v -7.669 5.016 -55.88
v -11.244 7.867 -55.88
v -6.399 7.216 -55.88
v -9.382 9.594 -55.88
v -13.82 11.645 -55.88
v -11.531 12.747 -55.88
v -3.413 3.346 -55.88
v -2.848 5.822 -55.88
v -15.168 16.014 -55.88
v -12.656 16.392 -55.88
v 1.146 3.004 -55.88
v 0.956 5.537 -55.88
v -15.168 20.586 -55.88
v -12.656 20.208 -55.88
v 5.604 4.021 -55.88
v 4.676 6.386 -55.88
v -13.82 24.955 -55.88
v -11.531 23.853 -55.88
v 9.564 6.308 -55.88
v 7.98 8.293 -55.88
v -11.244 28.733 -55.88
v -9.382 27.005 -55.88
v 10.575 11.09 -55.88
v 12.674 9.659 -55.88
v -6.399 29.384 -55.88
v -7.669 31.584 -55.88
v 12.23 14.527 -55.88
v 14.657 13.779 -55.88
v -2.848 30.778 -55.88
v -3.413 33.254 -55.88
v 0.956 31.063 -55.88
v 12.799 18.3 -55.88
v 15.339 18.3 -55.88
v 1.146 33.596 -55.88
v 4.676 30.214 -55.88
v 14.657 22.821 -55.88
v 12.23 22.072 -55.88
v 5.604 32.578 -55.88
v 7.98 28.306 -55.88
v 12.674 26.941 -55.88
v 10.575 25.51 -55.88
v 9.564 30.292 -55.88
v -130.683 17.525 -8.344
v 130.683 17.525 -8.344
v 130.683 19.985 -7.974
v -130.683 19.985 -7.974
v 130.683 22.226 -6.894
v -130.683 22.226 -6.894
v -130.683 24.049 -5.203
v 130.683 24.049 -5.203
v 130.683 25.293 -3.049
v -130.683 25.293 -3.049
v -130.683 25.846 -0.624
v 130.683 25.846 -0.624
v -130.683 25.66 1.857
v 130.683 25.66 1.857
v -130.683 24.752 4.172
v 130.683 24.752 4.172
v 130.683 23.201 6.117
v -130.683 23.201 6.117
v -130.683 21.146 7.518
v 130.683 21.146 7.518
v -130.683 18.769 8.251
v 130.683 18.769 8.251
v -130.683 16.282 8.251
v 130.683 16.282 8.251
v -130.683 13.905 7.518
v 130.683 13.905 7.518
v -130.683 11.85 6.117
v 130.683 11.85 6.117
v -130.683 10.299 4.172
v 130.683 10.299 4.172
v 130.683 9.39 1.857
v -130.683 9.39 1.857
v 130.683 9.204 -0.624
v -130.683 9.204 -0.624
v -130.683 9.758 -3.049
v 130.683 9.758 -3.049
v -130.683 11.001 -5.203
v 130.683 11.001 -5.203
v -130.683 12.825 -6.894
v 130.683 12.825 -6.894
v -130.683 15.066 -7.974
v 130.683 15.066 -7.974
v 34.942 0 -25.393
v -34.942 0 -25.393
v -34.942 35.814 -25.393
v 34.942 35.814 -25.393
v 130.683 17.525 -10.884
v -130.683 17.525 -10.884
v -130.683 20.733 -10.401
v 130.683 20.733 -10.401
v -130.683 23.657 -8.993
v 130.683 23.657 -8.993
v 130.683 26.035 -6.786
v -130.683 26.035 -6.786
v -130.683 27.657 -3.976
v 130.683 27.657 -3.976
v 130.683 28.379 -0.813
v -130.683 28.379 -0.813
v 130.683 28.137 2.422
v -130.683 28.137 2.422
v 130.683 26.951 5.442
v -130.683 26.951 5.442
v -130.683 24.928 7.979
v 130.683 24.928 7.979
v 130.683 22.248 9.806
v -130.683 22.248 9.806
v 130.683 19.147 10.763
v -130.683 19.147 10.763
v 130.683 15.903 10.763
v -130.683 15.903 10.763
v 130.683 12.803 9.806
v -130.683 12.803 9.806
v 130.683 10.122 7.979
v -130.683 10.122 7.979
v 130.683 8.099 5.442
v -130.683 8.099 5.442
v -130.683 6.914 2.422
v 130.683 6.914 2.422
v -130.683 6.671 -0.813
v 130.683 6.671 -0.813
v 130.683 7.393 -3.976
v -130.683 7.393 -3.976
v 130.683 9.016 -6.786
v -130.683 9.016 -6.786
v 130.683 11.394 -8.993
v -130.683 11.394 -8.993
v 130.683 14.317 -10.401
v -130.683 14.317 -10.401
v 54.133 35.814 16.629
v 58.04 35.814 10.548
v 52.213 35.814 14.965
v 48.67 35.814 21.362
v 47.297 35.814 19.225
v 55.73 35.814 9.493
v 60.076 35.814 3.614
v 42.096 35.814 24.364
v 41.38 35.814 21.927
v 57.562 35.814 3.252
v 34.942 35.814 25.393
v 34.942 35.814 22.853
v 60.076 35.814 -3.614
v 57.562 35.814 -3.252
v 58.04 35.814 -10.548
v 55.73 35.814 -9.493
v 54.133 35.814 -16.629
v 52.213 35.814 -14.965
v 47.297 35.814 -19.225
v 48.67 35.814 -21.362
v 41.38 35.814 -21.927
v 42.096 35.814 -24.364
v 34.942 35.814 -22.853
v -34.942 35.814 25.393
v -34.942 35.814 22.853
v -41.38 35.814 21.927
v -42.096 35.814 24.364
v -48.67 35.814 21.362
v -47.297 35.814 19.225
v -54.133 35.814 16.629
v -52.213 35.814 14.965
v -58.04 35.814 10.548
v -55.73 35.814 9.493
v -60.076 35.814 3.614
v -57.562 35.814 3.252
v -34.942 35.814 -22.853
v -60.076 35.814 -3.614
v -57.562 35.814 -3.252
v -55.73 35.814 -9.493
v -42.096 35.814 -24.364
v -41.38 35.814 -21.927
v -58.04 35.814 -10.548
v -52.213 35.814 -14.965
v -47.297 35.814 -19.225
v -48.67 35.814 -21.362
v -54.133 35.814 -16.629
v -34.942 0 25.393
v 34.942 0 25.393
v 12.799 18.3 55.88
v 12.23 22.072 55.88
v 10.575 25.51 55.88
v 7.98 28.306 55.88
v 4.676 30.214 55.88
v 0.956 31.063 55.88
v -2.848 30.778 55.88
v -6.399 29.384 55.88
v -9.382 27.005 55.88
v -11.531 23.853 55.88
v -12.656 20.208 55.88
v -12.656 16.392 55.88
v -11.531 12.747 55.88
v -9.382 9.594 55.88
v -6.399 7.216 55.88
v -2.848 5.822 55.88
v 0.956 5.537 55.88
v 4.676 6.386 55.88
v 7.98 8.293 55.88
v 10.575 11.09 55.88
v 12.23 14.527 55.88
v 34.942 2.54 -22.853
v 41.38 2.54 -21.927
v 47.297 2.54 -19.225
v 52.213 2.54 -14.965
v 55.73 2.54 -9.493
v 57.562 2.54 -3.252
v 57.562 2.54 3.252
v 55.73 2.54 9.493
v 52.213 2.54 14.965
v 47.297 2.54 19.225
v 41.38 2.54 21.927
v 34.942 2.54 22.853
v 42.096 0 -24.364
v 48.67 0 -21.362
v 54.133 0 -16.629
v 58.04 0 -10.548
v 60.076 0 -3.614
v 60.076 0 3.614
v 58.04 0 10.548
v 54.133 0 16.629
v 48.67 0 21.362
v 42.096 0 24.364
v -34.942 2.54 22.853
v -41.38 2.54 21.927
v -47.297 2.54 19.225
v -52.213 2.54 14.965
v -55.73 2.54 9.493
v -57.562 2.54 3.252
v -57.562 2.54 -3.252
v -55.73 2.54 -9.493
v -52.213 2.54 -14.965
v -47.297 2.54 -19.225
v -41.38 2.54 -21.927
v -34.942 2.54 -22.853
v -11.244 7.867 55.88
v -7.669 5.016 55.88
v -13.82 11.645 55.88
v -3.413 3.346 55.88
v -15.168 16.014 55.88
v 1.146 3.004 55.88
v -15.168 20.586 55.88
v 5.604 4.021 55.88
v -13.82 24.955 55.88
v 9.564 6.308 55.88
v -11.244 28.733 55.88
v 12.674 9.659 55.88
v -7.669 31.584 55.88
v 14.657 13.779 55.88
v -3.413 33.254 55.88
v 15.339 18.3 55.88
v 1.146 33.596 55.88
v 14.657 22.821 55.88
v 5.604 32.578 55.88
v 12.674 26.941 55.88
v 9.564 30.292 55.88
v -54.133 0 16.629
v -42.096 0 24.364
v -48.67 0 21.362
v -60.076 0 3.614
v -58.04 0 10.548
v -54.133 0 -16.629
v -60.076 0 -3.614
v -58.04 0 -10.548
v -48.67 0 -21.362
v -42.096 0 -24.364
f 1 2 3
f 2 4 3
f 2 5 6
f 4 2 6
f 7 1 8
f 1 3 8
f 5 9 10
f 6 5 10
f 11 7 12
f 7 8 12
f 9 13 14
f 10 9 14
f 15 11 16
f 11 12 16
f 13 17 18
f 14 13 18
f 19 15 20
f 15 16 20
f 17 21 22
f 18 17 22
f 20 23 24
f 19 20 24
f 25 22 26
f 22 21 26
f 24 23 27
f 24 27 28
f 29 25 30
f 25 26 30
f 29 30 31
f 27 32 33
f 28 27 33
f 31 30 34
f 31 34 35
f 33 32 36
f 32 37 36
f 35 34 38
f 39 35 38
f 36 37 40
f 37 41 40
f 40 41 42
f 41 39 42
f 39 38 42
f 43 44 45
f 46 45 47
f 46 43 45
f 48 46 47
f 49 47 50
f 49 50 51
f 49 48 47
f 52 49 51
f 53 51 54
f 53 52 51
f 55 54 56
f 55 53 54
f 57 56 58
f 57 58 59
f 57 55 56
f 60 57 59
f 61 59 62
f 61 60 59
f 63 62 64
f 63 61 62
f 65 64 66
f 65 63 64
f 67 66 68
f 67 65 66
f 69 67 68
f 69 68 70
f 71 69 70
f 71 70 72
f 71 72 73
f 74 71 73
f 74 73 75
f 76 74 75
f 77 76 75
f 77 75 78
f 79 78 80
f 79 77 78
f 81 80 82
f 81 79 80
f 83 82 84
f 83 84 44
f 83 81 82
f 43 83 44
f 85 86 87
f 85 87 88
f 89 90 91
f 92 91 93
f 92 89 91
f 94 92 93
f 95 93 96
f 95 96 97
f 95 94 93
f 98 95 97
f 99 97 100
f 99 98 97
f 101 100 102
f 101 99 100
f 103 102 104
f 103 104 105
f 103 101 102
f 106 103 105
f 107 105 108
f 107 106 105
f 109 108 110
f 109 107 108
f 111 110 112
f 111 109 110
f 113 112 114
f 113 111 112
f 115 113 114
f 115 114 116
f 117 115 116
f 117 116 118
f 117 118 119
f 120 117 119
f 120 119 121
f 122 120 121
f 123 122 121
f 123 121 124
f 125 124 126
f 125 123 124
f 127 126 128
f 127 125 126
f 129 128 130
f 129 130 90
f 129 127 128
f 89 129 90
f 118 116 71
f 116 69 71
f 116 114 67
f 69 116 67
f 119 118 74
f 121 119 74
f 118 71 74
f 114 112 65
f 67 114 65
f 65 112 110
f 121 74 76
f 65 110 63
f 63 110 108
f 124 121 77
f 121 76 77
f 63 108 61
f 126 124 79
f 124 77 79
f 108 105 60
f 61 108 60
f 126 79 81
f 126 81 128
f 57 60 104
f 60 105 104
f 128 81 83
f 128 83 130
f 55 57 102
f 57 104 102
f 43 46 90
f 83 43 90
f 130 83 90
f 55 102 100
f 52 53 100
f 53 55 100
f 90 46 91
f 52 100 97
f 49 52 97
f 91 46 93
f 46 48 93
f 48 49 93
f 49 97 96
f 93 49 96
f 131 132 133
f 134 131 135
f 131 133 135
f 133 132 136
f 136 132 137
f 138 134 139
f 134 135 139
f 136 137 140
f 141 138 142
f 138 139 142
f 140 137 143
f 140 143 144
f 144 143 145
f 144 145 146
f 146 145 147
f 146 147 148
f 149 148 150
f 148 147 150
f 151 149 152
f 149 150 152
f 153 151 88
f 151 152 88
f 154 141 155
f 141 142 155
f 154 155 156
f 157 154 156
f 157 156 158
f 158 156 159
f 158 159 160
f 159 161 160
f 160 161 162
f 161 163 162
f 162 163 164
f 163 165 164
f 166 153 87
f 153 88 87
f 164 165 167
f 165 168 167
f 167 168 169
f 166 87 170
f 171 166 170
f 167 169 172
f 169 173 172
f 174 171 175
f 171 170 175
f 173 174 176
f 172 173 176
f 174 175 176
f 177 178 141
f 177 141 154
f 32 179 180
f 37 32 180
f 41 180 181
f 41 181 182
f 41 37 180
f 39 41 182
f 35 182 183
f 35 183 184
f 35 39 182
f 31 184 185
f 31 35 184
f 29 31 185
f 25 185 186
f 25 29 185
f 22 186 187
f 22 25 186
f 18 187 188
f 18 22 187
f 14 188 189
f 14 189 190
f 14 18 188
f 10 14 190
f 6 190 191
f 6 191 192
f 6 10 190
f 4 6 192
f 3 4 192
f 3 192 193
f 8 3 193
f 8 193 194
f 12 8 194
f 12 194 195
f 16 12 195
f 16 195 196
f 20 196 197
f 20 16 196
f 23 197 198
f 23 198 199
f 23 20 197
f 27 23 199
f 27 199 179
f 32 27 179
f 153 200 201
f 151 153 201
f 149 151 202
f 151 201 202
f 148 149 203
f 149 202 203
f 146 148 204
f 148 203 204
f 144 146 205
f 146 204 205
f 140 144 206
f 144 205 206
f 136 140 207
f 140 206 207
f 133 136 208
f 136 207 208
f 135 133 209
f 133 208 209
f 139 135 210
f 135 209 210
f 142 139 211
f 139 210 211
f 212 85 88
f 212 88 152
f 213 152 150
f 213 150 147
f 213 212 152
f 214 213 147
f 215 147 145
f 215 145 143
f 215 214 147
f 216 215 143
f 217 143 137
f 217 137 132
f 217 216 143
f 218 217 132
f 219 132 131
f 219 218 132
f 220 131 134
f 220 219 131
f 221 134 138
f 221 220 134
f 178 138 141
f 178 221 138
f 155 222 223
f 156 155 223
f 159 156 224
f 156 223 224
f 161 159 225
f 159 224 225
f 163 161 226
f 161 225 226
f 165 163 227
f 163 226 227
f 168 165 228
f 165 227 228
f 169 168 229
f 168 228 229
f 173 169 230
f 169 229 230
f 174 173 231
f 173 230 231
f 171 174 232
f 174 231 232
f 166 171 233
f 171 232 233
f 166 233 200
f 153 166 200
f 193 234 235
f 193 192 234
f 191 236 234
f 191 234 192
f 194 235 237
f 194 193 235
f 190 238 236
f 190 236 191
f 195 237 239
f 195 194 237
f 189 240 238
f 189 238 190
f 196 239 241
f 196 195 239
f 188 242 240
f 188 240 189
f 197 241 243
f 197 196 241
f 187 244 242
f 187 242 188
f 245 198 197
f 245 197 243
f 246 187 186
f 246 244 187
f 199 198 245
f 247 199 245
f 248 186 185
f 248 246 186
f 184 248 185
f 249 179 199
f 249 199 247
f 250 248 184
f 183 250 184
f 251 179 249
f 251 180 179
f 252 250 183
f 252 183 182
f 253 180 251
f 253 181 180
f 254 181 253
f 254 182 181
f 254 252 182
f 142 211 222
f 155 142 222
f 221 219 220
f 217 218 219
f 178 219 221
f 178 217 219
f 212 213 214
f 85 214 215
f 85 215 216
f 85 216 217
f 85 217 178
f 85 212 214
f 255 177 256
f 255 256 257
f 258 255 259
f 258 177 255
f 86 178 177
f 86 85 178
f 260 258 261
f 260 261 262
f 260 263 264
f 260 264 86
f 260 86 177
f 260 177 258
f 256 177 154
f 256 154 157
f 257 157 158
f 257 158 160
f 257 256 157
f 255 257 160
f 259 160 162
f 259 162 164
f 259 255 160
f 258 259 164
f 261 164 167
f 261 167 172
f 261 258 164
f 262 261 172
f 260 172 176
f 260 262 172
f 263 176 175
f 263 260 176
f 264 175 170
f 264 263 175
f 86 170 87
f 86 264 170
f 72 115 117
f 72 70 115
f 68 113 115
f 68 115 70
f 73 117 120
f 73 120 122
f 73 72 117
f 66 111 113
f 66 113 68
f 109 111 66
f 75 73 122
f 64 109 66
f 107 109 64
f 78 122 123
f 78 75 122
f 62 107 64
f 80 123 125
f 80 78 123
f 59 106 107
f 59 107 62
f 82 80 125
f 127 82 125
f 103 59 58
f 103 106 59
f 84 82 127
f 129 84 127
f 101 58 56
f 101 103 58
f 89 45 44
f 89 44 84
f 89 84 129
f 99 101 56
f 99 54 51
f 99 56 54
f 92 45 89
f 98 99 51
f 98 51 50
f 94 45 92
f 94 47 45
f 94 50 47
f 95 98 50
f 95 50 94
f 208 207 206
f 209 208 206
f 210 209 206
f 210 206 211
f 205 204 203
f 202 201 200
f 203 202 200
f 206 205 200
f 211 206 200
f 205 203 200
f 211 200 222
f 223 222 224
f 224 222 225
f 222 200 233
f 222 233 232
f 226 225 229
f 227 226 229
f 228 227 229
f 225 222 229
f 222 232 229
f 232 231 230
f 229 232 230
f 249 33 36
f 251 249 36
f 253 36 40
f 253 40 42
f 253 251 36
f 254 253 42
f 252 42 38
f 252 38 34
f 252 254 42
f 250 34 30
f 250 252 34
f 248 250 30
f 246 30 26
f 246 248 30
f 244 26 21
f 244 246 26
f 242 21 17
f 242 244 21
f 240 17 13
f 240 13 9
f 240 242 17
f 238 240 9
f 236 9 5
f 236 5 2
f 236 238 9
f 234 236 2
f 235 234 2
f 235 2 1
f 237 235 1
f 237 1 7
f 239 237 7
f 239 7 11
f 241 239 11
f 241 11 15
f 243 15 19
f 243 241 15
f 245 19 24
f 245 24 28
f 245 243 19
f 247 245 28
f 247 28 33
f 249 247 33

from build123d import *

# Parameters (mm, degrees)
BOSS_EXTRUDE1_DEPTH = 35.814
SHELL1_T            = -2.54
SKETCH2_R           = 10.884269179
SKETCH2_R_2         = 8.344269179
EXTRUDE_THIN1_DEPTH = 130.683
SKETCH3_R           = 15.338870546
SKETCH3_R_2         = 12.798870546
EXTRUDE_THIN2_DEPTH = 55.88


with BuildPart() as part:
    # Sketch1 → Boss-Extrude1 (new body)
    with BuildSketch(Plane(origin=(0, 0, 0), x_dir=(1, 0, 0), z_dir=(0, 1, 0))):
        with BuildLine():
            Line((-34.942128478, 25.392607038), (34.942128478, 25.392607038))
            ThreePointArc((34.942128478, 25.392607038), (60.334735516, 0), (34.942128478, -25.392607038))
            Line((34.942128478, -25.392607038), (-34.942128478, -25.392607038))
            ThreePointArc((-34.942128478, -25.392607038), (-60.334735516, 0), (-34.942128478, 25.392607038))
        make_face()
    extrude(amount=BOSS_EXTRUDE1_DEPTH)

    # Shell1
    shell1_openings = [part.faces().sort_by_distance(p)[0] for p in [
        (0, 35.814, 0),
    ]]
    offset(amount=SHELL1_T, openings=shell1_openings, kind=Kind.INTERSECTION)


with BuildPart() as body_2:
    # Sketch2 → Extrude-Thin1 (new body, symmetric)
    with BuildSketch(Plane(origin=(0, 0, 0), x_dir=(0, 0, -1), z_dir=(1, 0, 0))):
        with Locations((0, 17.525247937)):
            Circle(SKETCH2_R)
        with Locations((0, 17.525247937)):
            Circle(SKETCH2_R_2, mode=Mode.SUBTRACT)
    extrude(amount=EXTRUDE_THIN1_DEPTH, both=True)


with BuildPart() as body_3:
    # Sketch3 → Extrude-Thin2 (new body, symmetric)
    with BuildSketch(Plane.XY):
        with Locations((0, 18.299937242)):
            Circle(SKETCH3_R)
        with Locations((0, 18.299937242)):
            Circle(SKETCH3_R_2, mode=Mode.SUBTRACT)
    extrude(amount=EXTRUDE_THIN2_DEPTH, both=True)


solid = Compound([part.part, body_2.part, body_3.part])
